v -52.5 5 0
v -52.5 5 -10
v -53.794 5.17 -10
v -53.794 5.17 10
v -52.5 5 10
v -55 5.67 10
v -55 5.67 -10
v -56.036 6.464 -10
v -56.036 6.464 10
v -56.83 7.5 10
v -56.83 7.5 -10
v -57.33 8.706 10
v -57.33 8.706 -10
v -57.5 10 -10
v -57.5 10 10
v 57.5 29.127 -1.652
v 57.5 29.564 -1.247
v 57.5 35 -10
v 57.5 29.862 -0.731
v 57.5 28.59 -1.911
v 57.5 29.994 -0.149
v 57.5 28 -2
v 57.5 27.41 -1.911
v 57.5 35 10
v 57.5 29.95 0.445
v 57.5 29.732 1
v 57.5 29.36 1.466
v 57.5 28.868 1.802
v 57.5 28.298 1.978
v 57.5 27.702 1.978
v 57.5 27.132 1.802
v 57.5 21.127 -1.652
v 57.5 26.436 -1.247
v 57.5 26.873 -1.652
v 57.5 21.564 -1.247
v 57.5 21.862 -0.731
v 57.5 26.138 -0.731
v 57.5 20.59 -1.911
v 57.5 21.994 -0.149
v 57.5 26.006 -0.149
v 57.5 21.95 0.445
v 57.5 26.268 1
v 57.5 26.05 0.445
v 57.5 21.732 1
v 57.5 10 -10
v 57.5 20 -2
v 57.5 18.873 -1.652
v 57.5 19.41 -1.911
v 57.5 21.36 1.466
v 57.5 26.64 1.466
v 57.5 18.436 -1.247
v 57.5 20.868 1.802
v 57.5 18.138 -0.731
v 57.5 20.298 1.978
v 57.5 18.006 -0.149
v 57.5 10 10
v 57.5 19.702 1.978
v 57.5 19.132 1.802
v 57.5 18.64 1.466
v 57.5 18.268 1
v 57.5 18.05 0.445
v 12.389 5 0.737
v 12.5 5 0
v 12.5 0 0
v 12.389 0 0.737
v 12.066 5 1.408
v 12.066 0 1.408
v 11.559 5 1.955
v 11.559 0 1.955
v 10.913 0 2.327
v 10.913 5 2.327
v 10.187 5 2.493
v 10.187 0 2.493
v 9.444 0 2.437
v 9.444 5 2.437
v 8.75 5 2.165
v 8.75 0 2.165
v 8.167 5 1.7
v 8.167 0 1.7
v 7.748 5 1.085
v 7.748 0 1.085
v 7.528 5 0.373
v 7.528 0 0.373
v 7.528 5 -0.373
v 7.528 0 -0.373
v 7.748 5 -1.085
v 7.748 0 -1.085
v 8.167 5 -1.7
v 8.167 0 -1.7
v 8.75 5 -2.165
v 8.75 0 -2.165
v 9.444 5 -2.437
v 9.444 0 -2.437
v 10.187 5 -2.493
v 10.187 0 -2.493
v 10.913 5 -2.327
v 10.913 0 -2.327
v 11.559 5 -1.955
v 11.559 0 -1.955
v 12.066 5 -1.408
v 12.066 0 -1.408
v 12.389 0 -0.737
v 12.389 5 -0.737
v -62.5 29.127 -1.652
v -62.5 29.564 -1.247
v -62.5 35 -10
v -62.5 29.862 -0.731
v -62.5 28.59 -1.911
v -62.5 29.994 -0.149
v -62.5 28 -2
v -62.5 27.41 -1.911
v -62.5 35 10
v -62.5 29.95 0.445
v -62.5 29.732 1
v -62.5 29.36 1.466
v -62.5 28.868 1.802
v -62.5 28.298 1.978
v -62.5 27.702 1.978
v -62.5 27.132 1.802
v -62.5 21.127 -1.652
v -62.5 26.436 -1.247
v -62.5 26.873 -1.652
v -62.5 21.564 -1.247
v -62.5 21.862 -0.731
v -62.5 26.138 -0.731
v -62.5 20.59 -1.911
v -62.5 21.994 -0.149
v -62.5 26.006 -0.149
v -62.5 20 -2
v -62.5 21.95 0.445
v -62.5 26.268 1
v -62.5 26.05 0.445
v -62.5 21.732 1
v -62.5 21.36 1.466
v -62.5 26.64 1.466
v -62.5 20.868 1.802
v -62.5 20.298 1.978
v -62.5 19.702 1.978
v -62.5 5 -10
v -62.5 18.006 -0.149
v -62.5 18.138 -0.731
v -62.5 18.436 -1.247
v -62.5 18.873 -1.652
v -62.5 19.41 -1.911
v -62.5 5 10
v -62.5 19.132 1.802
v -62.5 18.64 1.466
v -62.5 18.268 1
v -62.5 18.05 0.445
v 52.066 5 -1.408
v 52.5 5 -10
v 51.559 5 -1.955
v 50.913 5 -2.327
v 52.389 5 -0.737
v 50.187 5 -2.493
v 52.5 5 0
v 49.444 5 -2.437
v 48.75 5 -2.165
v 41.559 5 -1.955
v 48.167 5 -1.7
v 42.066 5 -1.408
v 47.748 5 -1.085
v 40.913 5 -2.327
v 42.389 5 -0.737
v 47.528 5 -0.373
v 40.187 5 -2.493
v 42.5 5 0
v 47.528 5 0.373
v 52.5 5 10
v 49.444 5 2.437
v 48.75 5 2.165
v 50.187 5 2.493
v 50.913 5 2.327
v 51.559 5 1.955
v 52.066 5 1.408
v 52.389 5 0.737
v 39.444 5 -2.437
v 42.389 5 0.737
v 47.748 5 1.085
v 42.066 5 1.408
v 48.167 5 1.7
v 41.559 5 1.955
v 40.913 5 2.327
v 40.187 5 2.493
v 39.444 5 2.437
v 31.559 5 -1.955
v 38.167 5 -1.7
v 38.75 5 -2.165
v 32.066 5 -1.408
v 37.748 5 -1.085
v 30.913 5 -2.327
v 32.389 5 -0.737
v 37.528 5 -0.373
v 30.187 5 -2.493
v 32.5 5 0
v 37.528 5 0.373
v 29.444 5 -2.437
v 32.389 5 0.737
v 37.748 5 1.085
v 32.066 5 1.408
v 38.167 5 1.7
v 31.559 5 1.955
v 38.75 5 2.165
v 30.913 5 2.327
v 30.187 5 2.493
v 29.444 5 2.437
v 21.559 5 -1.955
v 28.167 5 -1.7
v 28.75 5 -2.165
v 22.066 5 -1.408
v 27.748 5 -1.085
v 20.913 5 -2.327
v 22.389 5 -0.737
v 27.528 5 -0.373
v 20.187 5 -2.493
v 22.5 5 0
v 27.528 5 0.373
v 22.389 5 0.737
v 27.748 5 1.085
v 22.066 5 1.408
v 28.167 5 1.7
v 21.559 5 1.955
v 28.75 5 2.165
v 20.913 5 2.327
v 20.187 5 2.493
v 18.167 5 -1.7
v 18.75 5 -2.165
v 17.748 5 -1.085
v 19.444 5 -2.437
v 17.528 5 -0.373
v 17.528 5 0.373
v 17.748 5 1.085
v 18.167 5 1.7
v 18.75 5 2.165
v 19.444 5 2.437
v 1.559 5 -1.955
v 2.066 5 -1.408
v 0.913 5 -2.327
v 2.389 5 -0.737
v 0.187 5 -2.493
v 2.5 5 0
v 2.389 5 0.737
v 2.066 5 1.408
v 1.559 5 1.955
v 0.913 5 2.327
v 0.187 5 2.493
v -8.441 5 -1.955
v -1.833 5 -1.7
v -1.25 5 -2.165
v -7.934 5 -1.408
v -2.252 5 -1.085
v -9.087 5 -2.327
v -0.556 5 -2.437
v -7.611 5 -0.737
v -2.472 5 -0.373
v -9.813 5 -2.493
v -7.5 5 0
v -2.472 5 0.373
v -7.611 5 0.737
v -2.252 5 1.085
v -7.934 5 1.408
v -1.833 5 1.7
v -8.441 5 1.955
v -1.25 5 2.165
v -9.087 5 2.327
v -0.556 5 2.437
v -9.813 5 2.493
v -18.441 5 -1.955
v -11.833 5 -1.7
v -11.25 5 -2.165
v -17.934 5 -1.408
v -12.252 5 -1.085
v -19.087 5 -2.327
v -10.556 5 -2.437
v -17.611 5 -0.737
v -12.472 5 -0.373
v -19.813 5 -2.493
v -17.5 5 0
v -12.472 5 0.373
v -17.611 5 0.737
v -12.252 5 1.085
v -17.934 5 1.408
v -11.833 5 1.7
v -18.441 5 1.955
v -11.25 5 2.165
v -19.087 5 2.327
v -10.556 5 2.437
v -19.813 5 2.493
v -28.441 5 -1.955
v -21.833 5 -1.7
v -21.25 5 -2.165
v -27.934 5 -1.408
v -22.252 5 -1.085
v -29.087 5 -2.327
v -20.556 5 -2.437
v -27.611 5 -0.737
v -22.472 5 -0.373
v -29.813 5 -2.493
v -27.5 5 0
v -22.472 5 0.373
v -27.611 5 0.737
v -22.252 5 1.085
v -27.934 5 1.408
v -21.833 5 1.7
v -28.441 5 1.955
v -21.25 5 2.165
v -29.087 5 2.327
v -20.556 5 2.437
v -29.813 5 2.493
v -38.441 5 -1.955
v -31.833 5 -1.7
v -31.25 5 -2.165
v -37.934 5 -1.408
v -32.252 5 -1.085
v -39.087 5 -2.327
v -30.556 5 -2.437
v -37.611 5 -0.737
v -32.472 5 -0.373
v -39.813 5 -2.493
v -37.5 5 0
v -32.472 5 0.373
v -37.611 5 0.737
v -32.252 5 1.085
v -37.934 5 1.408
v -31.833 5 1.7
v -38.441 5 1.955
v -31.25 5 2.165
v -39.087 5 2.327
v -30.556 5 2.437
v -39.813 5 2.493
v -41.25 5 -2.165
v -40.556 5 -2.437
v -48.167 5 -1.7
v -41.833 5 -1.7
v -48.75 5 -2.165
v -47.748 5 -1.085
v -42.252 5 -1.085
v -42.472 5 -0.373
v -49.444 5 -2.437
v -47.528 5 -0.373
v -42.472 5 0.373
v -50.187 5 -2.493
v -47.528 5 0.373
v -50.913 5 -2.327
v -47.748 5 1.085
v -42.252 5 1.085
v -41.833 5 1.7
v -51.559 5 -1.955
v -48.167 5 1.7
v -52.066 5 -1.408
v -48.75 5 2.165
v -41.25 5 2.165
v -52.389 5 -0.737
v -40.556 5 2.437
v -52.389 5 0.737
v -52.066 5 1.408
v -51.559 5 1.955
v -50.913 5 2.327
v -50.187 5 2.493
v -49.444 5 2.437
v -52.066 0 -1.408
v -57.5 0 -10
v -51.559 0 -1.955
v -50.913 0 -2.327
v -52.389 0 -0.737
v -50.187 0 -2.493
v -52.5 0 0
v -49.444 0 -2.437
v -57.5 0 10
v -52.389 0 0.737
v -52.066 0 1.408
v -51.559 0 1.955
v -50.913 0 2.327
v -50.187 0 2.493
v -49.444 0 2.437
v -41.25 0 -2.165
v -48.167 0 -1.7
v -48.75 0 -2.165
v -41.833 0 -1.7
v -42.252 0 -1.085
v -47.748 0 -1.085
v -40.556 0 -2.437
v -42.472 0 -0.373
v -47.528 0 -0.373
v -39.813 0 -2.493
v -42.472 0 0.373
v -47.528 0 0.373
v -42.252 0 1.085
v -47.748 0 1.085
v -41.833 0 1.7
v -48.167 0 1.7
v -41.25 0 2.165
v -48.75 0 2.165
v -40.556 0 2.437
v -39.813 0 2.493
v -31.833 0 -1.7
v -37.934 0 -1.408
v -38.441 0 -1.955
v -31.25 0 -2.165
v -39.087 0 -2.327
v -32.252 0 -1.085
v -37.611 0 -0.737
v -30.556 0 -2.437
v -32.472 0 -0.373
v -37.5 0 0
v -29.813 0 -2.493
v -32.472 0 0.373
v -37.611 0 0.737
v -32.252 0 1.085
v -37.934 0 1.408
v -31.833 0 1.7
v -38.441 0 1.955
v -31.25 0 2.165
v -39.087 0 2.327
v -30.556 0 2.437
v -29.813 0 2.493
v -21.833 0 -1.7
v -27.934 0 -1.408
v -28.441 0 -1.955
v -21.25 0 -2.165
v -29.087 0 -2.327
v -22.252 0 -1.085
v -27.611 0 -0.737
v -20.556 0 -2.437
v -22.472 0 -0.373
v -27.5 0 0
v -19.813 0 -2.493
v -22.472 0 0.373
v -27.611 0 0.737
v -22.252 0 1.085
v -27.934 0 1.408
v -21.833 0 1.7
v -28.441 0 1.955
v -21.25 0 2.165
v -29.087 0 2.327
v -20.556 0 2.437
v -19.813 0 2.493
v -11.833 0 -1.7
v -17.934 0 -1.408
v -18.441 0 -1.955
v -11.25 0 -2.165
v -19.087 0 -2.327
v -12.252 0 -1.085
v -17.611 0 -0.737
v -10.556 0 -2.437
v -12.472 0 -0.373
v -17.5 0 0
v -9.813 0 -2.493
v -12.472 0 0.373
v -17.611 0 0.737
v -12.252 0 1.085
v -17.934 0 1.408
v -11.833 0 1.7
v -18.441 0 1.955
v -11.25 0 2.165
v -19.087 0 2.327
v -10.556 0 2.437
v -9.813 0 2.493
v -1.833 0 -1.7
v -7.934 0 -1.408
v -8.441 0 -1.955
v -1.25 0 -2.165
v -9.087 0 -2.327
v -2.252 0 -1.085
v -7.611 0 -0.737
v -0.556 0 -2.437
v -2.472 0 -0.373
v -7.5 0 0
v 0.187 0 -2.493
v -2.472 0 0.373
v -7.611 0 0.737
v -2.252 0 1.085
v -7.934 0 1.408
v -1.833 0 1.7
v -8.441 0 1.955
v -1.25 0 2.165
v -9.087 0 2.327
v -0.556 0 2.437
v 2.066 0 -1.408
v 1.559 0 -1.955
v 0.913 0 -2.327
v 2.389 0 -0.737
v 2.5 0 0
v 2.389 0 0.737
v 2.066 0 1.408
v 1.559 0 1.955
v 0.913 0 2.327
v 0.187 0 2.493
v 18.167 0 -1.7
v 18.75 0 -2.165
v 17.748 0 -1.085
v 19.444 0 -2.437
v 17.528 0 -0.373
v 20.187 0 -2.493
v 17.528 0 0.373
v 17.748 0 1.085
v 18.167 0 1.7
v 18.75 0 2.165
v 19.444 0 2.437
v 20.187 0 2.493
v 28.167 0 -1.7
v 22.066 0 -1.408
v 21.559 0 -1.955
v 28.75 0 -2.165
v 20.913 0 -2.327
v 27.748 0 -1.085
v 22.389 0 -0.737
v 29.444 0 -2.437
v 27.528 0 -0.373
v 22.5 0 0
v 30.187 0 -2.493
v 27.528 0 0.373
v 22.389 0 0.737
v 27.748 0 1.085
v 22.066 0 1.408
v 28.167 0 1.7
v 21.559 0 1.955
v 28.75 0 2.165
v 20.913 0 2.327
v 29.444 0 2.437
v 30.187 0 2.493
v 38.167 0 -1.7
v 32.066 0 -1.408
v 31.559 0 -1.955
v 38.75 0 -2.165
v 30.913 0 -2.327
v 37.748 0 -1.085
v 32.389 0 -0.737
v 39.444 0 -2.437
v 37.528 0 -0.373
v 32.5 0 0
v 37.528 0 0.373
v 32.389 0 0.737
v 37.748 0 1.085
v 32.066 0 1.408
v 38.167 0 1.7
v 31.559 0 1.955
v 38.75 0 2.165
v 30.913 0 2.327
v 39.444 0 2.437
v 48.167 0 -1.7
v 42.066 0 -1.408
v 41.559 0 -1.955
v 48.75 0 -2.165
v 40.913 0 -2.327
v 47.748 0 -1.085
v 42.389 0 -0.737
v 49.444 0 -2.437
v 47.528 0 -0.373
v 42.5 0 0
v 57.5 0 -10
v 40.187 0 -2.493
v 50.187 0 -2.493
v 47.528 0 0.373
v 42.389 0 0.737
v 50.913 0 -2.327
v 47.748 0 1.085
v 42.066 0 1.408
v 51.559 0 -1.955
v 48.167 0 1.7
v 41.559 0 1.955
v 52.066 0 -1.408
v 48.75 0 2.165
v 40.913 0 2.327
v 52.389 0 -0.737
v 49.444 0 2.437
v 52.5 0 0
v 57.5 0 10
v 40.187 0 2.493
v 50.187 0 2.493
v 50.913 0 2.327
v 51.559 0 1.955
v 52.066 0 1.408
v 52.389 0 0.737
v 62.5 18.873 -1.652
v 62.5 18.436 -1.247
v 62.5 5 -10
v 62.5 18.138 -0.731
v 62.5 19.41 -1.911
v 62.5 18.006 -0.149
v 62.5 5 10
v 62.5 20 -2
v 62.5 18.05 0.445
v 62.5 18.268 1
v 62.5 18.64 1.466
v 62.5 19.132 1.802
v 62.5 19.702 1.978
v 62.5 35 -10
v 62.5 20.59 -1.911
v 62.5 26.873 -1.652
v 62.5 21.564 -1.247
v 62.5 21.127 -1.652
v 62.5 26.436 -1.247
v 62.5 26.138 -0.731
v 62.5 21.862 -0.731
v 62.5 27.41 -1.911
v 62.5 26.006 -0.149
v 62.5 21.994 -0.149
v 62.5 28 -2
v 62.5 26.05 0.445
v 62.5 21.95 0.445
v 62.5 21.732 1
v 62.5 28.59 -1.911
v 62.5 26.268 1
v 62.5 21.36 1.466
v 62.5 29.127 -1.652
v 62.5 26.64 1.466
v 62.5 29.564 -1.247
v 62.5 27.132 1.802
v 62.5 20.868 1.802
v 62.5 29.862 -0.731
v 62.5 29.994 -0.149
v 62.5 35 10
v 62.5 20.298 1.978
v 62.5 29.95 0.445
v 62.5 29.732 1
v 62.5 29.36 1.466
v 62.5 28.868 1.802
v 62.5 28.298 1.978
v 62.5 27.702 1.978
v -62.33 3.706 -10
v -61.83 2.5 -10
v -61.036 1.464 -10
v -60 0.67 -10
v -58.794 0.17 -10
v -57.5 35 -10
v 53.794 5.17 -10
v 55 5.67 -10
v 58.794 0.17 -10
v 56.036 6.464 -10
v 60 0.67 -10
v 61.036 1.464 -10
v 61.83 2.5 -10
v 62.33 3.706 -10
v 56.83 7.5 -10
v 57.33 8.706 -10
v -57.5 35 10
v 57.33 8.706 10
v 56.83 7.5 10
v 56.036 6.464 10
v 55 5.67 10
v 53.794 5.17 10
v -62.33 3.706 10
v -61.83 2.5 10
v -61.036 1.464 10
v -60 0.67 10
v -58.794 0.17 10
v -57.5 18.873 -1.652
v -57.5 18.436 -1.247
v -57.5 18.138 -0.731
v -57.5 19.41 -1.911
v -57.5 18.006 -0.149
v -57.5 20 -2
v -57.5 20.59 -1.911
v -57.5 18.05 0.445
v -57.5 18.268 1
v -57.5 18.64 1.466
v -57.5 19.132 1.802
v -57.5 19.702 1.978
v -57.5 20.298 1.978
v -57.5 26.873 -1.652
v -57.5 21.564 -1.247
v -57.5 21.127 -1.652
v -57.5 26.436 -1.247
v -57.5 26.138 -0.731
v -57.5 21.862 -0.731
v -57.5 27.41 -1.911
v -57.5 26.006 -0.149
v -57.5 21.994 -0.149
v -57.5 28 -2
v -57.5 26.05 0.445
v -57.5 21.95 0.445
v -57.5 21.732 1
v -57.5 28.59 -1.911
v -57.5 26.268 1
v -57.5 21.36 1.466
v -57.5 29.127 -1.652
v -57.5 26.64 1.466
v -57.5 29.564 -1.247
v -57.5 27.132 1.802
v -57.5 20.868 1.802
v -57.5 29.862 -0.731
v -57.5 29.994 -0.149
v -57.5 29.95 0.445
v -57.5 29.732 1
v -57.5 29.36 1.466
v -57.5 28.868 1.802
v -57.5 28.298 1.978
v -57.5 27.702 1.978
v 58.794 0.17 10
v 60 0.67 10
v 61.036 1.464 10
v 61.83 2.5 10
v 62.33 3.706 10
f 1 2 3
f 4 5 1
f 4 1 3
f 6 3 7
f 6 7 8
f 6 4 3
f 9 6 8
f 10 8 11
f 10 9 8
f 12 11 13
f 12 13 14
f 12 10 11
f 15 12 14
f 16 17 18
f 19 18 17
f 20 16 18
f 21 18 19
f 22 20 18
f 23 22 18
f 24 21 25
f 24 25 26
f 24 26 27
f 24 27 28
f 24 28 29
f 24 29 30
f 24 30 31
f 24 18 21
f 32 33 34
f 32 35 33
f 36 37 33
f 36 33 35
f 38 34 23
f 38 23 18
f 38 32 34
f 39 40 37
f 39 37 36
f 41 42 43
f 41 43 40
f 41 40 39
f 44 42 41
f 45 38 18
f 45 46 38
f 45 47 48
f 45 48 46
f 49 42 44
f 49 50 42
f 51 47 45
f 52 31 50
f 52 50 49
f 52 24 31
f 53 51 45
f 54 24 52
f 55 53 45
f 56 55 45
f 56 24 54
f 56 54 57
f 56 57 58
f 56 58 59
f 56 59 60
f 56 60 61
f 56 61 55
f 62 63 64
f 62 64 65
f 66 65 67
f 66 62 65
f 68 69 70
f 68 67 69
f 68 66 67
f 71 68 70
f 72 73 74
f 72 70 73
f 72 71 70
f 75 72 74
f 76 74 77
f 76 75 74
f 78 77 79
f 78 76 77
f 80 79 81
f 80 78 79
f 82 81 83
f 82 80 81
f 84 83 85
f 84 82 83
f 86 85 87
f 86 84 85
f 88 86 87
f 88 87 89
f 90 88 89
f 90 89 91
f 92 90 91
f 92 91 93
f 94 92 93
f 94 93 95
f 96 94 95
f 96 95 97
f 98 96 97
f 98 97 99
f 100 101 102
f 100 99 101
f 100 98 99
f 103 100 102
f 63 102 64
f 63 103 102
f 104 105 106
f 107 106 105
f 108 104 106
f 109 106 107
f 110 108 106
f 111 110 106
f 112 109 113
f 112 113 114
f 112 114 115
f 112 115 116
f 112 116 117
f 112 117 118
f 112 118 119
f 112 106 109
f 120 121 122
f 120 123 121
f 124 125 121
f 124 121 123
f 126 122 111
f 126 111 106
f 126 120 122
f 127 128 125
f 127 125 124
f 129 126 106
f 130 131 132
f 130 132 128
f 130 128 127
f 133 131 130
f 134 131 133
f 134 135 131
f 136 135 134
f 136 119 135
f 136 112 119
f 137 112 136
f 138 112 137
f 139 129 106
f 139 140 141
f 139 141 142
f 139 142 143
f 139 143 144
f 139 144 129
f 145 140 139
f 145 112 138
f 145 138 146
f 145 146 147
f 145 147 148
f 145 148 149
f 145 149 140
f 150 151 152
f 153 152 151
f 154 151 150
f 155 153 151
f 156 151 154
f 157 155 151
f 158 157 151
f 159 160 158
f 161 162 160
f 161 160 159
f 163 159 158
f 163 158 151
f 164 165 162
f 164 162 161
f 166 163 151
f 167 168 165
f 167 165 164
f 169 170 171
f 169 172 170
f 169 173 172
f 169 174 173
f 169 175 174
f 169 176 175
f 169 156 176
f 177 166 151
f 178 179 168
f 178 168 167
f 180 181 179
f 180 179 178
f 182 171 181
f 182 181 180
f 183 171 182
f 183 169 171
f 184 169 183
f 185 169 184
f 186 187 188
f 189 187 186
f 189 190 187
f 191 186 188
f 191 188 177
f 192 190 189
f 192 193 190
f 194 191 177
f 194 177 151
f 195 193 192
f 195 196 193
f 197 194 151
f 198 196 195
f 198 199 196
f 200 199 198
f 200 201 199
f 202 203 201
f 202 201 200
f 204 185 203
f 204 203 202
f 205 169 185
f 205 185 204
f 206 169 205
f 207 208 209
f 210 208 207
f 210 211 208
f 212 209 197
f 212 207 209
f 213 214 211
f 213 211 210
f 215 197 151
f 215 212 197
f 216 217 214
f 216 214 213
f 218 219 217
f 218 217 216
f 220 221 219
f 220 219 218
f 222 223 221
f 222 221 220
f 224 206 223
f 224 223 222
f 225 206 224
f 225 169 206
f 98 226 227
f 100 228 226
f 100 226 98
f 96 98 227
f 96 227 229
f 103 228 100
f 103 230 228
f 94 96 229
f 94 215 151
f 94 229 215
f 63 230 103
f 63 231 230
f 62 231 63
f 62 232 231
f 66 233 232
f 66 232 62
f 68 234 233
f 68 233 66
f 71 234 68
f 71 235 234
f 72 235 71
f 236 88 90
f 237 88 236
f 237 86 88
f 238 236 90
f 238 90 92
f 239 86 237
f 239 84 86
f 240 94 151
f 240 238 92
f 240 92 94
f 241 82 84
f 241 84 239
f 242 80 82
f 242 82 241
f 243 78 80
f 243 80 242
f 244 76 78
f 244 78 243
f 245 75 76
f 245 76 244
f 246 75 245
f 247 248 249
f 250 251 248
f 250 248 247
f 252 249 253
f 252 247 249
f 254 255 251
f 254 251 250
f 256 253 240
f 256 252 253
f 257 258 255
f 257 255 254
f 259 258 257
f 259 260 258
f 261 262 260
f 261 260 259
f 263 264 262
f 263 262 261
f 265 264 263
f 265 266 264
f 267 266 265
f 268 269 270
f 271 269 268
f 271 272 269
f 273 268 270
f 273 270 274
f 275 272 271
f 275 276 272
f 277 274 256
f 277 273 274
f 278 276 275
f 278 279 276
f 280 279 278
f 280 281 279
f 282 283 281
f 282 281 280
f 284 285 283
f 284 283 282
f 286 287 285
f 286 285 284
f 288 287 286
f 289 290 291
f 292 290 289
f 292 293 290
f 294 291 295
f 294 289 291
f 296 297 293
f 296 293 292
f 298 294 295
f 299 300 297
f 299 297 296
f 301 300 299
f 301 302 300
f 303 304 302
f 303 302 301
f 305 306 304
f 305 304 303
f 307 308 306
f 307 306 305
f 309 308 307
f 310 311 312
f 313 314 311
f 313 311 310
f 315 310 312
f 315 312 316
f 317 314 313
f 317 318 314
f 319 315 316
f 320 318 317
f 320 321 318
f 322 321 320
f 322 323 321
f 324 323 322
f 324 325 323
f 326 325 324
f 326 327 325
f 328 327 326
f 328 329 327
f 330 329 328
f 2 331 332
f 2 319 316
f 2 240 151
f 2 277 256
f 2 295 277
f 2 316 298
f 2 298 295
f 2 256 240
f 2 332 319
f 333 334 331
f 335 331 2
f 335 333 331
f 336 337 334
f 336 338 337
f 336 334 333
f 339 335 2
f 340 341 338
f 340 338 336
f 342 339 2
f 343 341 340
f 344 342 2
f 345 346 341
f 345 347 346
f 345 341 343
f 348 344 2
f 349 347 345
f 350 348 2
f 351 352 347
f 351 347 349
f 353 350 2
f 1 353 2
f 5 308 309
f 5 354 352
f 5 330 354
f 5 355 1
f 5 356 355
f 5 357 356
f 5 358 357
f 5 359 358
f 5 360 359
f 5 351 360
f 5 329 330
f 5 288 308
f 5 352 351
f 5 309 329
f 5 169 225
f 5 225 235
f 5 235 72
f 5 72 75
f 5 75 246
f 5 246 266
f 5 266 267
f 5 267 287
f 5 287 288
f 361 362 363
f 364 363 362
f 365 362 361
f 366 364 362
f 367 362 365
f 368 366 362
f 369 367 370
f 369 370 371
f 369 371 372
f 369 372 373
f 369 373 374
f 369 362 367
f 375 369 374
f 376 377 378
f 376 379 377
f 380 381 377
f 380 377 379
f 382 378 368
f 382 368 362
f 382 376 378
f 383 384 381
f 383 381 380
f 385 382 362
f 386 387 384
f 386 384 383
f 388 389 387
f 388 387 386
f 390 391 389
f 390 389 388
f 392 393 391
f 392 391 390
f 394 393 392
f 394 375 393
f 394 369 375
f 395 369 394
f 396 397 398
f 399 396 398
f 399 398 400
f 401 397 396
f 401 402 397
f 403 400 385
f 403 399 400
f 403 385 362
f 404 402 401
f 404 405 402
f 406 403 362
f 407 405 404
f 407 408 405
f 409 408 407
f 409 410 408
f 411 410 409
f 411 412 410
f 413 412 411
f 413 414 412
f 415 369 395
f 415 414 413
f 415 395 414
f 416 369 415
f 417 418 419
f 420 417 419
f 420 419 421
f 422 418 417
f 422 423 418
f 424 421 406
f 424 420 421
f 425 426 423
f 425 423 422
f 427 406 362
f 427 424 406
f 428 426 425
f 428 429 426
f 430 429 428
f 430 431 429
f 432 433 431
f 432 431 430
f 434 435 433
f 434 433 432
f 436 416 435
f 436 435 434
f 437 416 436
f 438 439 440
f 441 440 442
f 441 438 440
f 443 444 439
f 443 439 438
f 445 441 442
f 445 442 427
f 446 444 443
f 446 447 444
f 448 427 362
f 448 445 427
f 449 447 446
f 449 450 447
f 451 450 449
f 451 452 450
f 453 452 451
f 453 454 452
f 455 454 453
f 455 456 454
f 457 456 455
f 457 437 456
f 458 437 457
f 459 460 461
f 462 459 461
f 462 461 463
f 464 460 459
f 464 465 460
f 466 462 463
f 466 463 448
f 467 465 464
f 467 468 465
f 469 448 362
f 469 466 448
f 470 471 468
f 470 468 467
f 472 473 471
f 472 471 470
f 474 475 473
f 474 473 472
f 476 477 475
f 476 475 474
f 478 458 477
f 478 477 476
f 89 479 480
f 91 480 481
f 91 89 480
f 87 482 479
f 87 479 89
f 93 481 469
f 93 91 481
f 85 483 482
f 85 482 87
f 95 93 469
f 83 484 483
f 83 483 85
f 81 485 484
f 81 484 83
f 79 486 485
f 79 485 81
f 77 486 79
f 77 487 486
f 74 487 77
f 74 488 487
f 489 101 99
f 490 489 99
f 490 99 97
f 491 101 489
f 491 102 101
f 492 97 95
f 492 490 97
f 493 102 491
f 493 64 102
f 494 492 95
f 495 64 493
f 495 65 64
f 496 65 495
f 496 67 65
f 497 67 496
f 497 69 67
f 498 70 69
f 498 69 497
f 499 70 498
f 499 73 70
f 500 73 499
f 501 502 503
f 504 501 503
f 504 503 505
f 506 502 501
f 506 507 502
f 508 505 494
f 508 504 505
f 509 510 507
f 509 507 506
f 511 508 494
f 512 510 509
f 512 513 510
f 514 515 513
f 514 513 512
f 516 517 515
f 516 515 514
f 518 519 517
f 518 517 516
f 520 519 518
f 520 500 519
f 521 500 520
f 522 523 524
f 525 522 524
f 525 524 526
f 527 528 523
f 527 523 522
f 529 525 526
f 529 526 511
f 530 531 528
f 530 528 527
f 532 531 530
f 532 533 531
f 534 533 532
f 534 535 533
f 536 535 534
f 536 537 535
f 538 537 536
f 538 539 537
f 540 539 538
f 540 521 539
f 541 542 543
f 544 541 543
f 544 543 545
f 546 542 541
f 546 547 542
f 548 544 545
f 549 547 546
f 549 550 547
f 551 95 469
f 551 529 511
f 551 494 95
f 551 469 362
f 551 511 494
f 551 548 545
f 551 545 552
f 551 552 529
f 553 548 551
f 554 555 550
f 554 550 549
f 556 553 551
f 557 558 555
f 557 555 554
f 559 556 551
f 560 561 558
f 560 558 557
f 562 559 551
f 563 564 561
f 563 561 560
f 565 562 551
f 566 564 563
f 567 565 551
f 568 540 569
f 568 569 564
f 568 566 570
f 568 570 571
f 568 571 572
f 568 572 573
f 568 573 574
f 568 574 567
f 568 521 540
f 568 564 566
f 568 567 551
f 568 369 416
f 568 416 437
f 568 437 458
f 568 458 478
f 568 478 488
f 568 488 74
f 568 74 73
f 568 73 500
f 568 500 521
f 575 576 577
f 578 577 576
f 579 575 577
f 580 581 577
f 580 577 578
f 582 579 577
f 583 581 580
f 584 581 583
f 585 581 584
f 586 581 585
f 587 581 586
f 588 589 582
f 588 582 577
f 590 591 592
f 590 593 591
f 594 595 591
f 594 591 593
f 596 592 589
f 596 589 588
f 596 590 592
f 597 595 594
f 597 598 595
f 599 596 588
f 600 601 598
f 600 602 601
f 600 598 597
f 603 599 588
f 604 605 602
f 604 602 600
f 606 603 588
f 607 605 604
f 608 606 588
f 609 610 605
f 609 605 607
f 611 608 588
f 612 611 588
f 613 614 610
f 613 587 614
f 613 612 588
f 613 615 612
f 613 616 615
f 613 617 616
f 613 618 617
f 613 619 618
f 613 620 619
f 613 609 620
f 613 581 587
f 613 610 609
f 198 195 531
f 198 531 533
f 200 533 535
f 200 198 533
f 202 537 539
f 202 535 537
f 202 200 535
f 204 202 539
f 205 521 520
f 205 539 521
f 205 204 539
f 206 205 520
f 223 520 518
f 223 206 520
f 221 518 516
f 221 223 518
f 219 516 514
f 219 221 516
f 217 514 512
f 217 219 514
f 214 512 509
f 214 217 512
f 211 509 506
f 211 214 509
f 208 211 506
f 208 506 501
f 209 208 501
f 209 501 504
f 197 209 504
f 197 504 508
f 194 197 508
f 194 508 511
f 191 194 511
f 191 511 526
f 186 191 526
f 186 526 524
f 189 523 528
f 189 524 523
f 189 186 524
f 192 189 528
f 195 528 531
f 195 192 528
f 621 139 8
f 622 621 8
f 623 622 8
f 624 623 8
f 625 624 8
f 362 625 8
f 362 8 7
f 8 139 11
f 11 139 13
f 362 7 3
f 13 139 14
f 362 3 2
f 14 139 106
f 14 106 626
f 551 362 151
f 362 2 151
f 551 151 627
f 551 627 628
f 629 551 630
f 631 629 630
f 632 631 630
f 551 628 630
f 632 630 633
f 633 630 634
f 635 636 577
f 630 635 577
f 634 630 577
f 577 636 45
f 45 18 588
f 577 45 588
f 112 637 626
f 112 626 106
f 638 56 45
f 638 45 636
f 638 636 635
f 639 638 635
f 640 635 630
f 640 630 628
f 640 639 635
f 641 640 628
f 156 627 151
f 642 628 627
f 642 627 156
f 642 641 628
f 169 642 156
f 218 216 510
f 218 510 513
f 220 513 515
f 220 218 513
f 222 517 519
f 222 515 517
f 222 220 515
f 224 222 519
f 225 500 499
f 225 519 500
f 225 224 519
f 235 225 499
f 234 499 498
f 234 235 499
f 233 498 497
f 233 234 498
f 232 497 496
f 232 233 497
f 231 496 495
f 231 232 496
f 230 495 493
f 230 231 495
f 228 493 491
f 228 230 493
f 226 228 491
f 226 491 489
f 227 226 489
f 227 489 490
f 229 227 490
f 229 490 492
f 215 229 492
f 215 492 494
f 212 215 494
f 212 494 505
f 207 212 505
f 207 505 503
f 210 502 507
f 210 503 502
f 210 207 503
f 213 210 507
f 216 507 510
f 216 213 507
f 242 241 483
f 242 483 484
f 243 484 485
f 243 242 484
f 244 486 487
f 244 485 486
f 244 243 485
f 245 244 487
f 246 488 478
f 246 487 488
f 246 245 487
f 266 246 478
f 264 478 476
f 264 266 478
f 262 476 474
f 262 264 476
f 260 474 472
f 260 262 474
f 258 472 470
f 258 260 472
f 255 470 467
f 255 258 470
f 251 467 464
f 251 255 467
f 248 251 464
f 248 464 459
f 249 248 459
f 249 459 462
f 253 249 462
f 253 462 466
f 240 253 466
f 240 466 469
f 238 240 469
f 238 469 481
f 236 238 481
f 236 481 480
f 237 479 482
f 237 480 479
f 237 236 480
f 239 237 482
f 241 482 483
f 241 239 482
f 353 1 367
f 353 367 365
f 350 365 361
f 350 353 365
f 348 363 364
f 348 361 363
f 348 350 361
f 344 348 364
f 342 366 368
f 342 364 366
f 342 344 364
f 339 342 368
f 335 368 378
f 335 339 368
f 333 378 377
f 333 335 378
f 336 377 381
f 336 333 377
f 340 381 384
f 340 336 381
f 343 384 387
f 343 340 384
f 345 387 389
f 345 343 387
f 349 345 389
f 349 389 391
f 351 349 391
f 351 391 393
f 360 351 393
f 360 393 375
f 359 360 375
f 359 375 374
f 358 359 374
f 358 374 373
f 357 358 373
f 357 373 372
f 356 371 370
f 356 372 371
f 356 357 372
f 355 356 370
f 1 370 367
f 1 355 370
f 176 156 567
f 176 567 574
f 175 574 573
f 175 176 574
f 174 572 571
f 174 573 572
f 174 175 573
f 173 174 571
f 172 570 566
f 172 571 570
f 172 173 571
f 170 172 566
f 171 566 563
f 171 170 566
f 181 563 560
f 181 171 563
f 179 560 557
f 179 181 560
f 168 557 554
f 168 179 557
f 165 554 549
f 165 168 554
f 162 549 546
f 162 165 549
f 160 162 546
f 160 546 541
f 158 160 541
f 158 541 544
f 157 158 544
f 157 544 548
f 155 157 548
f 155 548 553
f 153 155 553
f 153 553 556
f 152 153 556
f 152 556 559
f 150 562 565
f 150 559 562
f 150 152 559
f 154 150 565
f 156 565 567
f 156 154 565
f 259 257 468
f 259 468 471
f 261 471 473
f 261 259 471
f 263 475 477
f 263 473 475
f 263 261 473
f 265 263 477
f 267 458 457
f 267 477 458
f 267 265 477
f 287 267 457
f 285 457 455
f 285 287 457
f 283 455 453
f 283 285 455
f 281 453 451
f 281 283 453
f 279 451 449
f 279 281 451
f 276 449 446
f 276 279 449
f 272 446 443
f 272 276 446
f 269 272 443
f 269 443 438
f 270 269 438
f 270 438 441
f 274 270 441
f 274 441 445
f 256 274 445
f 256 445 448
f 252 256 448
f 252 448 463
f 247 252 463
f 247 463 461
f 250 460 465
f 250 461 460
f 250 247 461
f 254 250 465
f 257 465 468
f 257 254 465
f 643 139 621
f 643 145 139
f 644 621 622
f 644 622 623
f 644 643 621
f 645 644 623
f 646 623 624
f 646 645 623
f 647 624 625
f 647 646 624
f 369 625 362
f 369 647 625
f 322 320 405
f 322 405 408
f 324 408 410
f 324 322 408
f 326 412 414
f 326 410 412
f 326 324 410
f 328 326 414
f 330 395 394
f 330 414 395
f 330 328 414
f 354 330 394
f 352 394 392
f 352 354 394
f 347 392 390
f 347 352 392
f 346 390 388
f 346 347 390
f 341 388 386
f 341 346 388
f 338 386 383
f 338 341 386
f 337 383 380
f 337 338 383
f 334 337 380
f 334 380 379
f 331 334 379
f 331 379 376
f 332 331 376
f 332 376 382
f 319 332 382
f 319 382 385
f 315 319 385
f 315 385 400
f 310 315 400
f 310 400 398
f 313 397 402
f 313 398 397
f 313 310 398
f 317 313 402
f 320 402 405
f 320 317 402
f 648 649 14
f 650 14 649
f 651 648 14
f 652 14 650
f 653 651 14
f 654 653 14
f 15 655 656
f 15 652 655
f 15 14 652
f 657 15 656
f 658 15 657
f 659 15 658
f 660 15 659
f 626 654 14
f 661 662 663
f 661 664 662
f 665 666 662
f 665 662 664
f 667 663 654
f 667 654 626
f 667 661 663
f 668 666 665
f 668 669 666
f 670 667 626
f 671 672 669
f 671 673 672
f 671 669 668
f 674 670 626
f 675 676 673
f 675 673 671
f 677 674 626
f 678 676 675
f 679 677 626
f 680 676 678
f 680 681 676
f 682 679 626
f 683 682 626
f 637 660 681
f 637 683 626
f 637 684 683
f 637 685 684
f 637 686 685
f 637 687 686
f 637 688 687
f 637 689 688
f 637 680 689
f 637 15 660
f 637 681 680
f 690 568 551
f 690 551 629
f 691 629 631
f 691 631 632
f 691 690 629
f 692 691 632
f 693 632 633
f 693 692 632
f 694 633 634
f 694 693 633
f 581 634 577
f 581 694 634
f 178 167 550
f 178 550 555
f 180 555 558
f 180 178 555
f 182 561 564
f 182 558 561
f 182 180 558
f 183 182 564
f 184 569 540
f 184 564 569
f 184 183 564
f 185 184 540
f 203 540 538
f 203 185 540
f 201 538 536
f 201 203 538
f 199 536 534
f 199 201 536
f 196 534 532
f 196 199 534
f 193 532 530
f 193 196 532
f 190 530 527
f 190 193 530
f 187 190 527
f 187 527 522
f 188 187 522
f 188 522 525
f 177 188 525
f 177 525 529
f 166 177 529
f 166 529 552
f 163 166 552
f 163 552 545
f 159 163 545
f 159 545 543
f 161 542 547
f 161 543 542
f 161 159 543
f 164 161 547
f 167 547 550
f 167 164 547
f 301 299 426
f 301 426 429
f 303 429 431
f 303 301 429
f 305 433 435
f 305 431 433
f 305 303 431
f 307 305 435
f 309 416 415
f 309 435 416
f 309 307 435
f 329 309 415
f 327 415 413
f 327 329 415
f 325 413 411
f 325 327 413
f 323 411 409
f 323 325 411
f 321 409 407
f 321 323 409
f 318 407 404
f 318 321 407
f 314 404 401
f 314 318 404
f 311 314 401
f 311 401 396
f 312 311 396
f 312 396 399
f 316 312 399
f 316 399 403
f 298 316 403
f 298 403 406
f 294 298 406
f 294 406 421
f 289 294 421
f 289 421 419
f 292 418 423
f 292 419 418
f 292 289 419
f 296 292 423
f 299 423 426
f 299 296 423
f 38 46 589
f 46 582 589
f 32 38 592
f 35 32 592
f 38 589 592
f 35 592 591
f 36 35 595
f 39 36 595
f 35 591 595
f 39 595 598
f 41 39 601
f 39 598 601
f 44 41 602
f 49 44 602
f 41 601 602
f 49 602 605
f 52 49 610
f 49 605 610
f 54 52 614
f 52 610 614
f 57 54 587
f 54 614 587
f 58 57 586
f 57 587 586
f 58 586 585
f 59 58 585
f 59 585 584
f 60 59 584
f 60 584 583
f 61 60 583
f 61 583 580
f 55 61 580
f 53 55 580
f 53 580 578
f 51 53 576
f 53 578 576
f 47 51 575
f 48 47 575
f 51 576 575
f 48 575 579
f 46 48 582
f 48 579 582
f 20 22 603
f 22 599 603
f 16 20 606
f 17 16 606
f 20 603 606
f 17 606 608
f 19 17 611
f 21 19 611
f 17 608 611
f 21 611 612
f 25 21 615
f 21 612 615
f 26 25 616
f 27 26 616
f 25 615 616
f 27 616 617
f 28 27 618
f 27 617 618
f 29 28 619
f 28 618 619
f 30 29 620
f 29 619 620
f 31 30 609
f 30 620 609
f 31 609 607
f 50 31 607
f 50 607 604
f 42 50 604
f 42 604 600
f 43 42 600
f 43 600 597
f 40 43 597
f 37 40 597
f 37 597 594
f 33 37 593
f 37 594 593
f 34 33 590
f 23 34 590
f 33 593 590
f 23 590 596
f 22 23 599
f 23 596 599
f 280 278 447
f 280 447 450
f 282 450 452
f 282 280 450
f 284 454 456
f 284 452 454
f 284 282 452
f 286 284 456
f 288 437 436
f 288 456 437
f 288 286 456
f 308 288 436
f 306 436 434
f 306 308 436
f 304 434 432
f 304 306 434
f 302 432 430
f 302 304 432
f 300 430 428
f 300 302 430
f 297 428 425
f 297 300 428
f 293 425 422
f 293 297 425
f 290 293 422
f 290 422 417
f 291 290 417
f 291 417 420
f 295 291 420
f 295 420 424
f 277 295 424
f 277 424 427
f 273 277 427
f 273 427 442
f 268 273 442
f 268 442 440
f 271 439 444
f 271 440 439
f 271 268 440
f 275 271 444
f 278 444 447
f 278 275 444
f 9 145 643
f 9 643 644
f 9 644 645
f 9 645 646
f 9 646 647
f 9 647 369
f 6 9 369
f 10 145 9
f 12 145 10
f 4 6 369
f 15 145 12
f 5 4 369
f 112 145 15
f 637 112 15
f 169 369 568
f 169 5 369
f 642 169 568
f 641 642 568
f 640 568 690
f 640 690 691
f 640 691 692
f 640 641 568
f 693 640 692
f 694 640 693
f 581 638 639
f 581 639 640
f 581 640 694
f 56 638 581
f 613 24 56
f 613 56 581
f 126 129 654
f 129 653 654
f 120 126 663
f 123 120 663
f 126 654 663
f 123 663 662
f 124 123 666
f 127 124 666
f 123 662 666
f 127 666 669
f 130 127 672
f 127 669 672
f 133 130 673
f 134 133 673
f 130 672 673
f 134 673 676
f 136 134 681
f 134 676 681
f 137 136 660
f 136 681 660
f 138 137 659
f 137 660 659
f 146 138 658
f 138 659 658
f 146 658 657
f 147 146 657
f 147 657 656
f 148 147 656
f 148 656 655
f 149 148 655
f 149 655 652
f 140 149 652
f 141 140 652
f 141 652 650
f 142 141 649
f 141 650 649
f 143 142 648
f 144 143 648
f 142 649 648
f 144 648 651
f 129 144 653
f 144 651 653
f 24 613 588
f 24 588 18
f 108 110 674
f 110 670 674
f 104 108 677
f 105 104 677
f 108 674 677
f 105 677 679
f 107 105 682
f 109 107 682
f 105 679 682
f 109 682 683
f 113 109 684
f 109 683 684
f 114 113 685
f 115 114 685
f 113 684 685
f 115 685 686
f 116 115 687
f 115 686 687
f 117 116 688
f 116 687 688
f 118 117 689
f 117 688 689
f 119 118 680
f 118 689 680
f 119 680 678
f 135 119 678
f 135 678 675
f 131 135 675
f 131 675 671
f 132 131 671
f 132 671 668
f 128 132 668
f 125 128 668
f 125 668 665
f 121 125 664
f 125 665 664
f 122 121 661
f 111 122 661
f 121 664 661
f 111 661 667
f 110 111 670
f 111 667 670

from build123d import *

# Parameters (mm, degrees)
BOSS_EXTRUDE1_DEPTH     = 10
SKETCH2_R               = 2
CUT_EXTRUDE1_DEPTH      = 131.192165663
LPATTERN2_COUNT         = 2
LPATTERN2_PITCH         = 8
CUT_EXTRUDE2_DEPTH      = 73.327380707
CUT_EXTRUDE2_DEPTH_BACK = 73.327380707
SKETCH3_R               = 2.5


with BuildPart() as part:
    # Sketch1 → Boss-Extrude1 (new, symmetric)
    with BuildSketch(Plane.XY):
        with BuildLine():
            Line((-57.5, 0), (57.5, 0))
            ThreePointArc((57.5, 0), (61.035533906, 1.464466094), (62.5, 5))
            Line((62.5, 5), (62.5, 35))
            Line((62.5, 35), (57.5, 35))
            Line((57.5, 35), (57.5, 10))
            ThreePointArc((57.5, 10), (56.035533906, 6.464466094), (52.5, 5))
            Line((52.5, 5), (-52.5, 5))
            ThreePointArc((-52.5, 5), (-56.035533906, 6.464466094), (-57.5, 10))
            Line((-57.5, 10), (-57.5, 35))
            Line((-57.5, 35), (-62.5, 35))
            Line((-62.5, 35), (-62.5, 5))
            ThreePointArc((-62.5, 5), (-61.035533906, 1.464466094), (-57.5, 0))
        make_face()
    extrude(amount=BOSS_EXTRUDE1_DEPTH, both=True)

    # Sketch2 → Cut-Extrude1 (cut, symmetric)
    with BuildSketch(Plane(origin=(62.5, 0, 0), x_dir=(0, 0, -1), z_dir=(1, 0, 0))):
        with Locations((0, 20)):
            Circle(SKETCH2_R)
    cut_extrude1 = extrude(amount=CUT_EXTRUDE1_DEPTH, both=True, mode=Mode.SUBTRACT)

    # LPattern2: Cut-Extrude1 ×2
    with Locations(*[(0, i * LPATTERN2_PITCH, 0) for i in range(1, LPATTERN2_COUNT)]):
        add(cut_extrude1, mode=Mode.SUBTRACT)

    # Sketch3 → Cut-Extrude2 (cut, two sides: drawn at the far end of the back side and taken through both)
    with BuildSketch(Plane.XZ.offset(-CUT_EXTRUDE2_DEPTH_BACK)):
        Circle(SKETCH3_R)
        with Locations((-10, 0)):
            Circle(SKETCH3_R)
        with Locations((-20, 0)):
            Circle(SKETCH3_R)
        with Locations((-30, 0)):
            Circle(SKETCH3_R)
        with Locations((-40, 0)):
            Circle(SKETCH3_R)
        with Locations(Location((-50, 0, 0), (0, 0, 180))):
            Circle(SKETCH3_R)
        with Locations((10, 0)):
            Circle(SKETCH3_R)
        with Locations((20, 0)):
            Circle(SKETCH3_R)
        with Locations((30, 0)):
            Circle(SKETCH3_R)
        with Locations((40, 0)):
            Circle(SKETCH3_R)
        with Locations((50, 0)):
            Circle(SKETCH3_R)
    extrude(amount=CUT_EXTRUDE2_DEPTH + CUT_EXTRUDE2_DEPTH_BACK, mode=Mode.SUBTRACT)


solid = part.part
